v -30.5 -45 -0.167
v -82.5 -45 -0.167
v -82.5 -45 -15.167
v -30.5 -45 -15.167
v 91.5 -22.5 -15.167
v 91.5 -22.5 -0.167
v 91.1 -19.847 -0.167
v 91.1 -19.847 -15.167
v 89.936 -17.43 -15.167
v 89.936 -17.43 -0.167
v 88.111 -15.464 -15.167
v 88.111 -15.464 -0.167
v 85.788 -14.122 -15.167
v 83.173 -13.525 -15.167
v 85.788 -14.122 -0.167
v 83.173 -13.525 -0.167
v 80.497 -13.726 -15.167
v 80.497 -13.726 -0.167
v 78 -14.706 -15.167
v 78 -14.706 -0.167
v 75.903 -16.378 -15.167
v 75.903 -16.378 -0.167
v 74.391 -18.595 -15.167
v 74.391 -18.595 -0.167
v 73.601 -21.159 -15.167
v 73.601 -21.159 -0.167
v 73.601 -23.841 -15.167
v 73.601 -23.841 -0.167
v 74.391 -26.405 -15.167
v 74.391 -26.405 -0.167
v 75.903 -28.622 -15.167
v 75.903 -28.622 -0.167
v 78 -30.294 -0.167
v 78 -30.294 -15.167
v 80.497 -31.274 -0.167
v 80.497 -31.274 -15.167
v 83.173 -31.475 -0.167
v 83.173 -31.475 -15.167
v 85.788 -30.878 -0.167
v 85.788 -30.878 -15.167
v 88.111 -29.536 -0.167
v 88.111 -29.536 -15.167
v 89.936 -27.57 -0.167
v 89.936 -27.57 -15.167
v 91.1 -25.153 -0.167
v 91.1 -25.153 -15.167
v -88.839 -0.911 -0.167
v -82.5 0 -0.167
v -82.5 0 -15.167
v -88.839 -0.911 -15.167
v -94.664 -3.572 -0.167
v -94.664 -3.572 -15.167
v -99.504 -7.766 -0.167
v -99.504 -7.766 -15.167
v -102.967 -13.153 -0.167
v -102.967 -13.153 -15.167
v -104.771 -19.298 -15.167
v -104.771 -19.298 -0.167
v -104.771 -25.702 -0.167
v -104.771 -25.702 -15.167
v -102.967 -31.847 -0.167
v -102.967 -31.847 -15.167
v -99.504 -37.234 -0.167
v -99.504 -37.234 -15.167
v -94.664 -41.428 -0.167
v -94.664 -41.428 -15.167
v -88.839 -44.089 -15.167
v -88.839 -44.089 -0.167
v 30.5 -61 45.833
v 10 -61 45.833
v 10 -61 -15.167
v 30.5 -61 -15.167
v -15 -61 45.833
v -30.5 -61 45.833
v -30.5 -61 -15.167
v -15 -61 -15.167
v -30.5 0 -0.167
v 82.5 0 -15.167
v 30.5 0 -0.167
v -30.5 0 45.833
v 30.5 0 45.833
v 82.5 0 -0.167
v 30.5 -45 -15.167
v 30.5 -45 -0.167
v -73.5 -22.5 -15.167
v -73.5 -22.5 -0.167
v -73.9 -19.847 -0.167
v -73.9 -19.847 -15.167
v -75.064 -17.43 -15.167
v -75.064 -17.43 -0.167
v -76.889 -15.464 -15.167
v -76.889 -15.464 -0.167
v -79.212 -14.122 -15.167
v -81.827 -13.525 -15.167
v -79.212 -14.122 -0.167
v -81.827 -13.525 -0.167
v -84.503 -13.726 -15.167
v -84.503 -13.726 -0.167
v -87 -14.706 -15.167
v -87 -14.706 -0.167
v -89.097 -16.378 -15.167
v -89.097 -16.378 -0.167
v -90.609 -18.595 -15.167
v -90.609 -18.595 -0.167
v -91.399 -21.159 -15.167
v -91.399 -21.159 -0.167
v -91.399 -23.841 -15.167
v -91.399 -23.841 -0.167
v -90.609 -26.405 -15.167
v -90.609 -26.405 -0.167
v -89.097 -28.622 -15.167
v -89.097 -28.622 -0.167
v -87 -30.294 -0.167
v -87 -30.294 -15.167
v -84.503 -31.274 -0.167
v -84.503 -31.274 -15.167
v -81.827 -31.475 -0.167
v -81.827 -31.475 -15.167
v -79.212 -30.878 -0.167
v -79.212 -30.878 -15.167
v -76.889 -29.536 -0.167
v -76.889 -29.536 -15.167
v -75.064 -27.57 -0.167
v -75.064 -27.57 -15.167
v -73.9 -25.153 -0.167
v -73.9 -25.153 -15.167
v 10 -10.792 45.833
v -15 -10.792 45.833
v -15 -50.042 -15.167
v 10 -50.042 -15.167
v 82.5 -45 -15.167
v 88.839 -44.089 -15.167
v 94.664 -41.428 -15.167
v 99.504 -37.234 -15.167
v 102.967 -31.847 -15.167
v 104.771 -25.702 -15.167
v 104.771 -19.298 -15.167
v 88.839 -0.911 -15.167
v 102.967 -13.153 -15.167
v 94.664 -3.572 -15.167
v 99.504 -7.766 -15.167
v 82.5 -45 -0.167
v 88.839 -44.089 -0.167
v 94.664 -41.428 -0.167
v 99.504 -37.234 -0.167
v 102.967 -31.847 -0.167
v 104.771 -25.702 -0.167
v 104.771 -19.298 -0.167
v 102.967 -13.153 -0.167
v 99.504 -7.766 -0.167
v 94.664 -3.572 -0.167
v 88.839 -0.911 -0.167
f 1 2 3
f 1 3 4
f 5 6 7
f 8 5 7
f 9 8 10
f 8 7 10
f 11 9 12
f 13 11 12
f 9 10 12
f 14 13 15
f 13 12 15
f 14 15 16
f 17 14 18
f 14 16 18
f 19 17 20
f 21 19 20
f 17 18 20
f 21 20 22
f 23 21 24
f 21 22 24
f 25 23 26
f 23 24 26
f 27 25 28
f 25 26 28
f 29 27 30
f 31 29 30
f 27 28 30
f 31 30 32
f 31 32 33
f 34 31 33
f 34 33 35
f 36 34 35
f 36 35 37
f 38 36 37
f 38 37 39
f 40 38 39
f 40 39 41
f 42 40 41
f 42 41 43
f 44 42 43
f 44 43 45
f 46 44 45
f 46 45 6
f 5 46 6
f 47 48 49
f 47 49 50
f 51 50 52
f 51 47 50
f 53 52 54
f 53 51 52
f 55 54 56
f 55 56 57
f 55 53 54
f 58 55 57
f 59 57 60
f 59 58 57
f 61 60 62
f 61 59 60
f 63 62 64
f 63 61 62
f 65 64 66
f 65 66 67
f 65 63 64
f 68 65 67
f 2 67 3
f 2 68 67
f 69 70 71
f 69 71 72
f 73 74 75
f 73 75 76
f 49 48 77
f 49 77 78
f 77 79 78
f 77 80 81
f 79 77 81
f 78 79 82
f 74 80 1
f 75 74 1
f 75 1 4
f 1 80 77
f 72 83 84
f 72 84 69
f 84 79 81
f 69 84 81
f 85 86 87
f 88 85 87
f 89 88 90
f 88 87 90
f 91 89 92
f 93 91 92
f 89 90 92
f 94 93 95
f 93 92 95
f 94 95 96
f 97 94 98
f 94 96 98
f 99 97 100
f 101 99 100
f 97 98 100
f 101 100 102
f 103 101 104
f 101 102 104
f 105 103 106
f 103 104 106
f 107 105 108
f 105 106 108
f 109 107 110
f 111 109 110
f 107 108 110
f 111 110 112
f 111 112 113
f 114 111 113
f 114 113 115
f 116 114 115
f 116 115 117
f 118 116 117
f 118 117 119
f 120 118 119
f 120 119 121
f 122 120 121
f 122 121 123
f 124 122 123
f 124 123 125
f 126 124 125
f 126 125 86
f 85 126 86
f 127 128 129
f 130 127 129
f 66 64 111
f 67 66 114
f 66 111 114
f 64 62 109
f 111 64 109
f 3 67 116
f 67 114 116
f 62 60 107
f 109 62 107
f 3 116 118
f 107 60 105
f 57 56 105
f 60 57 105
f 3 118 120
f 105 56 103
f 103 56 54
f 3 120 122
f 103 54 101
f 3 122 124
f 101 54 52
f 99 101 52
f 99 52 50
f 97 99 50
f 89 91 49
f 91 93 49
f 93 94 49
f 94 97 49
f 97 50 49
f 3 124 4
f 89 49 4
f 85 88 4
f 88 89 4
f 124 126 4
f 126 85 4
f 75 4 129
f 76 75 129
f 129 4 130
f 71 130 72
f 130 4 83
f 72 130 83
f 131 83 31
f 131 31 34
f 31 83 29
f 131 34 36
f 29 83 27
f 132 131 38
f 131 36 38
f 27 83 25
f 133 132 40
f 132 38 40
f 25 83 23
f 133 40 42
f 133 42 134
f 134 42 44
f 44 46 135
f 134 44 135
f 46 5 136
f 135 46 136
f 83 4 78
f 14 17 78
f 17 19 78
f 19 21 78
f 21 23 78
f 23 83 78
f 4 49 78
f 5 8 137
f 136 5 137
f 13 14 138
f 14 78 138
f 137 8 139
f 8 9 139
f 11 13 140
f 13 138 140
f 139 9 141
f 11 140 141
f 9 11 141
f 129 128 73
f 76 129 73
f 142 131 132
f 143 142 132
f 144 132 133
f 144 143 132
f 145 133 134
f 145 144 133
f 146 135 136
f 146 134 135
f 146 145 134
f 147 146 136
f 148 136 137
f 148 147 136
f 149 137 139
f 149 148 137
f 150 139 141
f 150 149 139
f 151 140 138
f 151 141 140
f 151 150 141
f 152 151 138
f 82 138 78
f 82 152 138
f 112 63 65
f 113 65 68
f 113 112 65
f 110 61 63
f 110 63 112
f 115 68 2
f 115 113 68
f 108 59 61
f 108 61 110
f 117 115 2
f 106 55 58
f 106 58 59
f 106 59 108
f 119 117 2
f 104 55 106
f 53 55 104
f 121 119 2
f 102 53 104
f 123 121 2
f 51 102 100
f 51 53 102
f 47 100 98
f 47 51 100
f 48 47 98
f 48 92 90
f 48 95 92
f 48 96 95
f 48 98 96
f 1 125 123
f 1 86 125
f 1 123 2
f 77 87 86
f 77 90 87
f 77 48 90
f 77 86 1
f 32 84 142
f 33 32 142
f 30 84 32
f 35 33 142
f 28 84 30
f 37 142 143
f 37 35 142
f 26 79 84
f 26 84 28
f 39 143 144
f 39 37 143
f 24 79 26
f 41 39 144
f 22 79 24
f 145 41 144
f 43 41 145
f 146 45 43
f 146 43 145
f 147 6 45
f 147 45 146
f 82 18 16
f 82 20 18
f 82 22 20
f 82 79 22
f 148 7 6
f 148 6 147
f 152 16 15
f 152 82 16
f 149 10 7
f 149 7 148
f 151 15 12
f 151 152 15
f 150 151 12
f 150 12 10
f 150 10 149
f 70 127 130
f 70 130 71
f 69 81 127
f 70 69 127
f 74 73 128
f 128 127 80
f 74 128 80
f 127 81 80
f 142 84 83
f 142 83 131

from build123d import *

# Parameters (mm, degrees)
F0_W      = 52
F0_H      = 15
F1_DEPTH  = 45
F2_DEPTH  = 61
F3_R      = 22.5
F4_DEPTH  = 15
F6_R      = 9
F5_R      = 9
F7_DEPTH  = 25
F10_DEPTH = 25


with BuildPart() as f1:
    # F0 (on Front) → F1 (new body)
    with BuildSketch(Plane.XZ):
        with Locations((-56.5, -7.6666666667)):
            Rectangle(F0_W, F0_H)
    extrude(amount=F1_DEPTH)



with BuildPart() as f1b:
    # F0 (on Front) → F1, piece 2 (new body)
    with BuildSketch(Plane.XZ):
        with Locations((56.5, -7.6666666667)):
            Rectangle(F0_W, F0_H)
    extrude(amount=F1_DEPTH)


with BuildPart() as f1_1:
    add(f1.part)

    add(f1b.part)  # F2 merges F1b
    # F0 (on Front) → F2 (join)
    with BuildSketch(Plane.XZ):
        Polygon((30.5, 45.8333333333), (-30.5, 45.8333333333), (-30.5, -0.1666666667), (-30.5, -15.1666666667), (30.5, -15.1666666667), (30.5, -0.1666666667), align=None)
    extrude(amount=F2_DEPTH)

    # F3 (on face) → F4 (join)
    with BuildSketch(Plane.XY.offset(-0.1666666667)):
        with BuildLine():
            Line((-82.5, -45), (-82.5, 0))
            ThreePointArc((-82.5, 0), (-105, -22.5), (-82.5, -45))
        make_face()
        with Locations((82.5, -22.5)):
            Circle(F3_R)
    extrude(amount=-F4_DEPTH)

    # F6 (on face) + F5 (on face) → F7 (cut)
    with BuildSketch(Plane.XY.offset(-0.1666666667)):
        with Locations((82.5, -22.5)):
            Circle(F6_R)
    with BuildSketch(Plane.XY.offset(-0.1666666667)):
        with Locations((-82.5, -22.5)):
            Circle(F5_R)
    extrude(amount=-F7_DEPTH, mode=Mode.SUBTRACT)

    # F9 (on offset) → F10 (cut)
    with BuildSketch(Plane(origin=(-15, 0, 0), x_dir=(0, -1, 0), z_dir=(-1, 0, 0))):
        Polygon((61.0416666667, 45.8333333333), (10.7916666667, 45.8333333333), (50.0416666667, -15.1666666667), (61.0416666667, -15.1666666667), align=None)
    extrude(amount=-F10_DEPTH, mode=Mode.SUBTRACT)


solid = f1_1.part
